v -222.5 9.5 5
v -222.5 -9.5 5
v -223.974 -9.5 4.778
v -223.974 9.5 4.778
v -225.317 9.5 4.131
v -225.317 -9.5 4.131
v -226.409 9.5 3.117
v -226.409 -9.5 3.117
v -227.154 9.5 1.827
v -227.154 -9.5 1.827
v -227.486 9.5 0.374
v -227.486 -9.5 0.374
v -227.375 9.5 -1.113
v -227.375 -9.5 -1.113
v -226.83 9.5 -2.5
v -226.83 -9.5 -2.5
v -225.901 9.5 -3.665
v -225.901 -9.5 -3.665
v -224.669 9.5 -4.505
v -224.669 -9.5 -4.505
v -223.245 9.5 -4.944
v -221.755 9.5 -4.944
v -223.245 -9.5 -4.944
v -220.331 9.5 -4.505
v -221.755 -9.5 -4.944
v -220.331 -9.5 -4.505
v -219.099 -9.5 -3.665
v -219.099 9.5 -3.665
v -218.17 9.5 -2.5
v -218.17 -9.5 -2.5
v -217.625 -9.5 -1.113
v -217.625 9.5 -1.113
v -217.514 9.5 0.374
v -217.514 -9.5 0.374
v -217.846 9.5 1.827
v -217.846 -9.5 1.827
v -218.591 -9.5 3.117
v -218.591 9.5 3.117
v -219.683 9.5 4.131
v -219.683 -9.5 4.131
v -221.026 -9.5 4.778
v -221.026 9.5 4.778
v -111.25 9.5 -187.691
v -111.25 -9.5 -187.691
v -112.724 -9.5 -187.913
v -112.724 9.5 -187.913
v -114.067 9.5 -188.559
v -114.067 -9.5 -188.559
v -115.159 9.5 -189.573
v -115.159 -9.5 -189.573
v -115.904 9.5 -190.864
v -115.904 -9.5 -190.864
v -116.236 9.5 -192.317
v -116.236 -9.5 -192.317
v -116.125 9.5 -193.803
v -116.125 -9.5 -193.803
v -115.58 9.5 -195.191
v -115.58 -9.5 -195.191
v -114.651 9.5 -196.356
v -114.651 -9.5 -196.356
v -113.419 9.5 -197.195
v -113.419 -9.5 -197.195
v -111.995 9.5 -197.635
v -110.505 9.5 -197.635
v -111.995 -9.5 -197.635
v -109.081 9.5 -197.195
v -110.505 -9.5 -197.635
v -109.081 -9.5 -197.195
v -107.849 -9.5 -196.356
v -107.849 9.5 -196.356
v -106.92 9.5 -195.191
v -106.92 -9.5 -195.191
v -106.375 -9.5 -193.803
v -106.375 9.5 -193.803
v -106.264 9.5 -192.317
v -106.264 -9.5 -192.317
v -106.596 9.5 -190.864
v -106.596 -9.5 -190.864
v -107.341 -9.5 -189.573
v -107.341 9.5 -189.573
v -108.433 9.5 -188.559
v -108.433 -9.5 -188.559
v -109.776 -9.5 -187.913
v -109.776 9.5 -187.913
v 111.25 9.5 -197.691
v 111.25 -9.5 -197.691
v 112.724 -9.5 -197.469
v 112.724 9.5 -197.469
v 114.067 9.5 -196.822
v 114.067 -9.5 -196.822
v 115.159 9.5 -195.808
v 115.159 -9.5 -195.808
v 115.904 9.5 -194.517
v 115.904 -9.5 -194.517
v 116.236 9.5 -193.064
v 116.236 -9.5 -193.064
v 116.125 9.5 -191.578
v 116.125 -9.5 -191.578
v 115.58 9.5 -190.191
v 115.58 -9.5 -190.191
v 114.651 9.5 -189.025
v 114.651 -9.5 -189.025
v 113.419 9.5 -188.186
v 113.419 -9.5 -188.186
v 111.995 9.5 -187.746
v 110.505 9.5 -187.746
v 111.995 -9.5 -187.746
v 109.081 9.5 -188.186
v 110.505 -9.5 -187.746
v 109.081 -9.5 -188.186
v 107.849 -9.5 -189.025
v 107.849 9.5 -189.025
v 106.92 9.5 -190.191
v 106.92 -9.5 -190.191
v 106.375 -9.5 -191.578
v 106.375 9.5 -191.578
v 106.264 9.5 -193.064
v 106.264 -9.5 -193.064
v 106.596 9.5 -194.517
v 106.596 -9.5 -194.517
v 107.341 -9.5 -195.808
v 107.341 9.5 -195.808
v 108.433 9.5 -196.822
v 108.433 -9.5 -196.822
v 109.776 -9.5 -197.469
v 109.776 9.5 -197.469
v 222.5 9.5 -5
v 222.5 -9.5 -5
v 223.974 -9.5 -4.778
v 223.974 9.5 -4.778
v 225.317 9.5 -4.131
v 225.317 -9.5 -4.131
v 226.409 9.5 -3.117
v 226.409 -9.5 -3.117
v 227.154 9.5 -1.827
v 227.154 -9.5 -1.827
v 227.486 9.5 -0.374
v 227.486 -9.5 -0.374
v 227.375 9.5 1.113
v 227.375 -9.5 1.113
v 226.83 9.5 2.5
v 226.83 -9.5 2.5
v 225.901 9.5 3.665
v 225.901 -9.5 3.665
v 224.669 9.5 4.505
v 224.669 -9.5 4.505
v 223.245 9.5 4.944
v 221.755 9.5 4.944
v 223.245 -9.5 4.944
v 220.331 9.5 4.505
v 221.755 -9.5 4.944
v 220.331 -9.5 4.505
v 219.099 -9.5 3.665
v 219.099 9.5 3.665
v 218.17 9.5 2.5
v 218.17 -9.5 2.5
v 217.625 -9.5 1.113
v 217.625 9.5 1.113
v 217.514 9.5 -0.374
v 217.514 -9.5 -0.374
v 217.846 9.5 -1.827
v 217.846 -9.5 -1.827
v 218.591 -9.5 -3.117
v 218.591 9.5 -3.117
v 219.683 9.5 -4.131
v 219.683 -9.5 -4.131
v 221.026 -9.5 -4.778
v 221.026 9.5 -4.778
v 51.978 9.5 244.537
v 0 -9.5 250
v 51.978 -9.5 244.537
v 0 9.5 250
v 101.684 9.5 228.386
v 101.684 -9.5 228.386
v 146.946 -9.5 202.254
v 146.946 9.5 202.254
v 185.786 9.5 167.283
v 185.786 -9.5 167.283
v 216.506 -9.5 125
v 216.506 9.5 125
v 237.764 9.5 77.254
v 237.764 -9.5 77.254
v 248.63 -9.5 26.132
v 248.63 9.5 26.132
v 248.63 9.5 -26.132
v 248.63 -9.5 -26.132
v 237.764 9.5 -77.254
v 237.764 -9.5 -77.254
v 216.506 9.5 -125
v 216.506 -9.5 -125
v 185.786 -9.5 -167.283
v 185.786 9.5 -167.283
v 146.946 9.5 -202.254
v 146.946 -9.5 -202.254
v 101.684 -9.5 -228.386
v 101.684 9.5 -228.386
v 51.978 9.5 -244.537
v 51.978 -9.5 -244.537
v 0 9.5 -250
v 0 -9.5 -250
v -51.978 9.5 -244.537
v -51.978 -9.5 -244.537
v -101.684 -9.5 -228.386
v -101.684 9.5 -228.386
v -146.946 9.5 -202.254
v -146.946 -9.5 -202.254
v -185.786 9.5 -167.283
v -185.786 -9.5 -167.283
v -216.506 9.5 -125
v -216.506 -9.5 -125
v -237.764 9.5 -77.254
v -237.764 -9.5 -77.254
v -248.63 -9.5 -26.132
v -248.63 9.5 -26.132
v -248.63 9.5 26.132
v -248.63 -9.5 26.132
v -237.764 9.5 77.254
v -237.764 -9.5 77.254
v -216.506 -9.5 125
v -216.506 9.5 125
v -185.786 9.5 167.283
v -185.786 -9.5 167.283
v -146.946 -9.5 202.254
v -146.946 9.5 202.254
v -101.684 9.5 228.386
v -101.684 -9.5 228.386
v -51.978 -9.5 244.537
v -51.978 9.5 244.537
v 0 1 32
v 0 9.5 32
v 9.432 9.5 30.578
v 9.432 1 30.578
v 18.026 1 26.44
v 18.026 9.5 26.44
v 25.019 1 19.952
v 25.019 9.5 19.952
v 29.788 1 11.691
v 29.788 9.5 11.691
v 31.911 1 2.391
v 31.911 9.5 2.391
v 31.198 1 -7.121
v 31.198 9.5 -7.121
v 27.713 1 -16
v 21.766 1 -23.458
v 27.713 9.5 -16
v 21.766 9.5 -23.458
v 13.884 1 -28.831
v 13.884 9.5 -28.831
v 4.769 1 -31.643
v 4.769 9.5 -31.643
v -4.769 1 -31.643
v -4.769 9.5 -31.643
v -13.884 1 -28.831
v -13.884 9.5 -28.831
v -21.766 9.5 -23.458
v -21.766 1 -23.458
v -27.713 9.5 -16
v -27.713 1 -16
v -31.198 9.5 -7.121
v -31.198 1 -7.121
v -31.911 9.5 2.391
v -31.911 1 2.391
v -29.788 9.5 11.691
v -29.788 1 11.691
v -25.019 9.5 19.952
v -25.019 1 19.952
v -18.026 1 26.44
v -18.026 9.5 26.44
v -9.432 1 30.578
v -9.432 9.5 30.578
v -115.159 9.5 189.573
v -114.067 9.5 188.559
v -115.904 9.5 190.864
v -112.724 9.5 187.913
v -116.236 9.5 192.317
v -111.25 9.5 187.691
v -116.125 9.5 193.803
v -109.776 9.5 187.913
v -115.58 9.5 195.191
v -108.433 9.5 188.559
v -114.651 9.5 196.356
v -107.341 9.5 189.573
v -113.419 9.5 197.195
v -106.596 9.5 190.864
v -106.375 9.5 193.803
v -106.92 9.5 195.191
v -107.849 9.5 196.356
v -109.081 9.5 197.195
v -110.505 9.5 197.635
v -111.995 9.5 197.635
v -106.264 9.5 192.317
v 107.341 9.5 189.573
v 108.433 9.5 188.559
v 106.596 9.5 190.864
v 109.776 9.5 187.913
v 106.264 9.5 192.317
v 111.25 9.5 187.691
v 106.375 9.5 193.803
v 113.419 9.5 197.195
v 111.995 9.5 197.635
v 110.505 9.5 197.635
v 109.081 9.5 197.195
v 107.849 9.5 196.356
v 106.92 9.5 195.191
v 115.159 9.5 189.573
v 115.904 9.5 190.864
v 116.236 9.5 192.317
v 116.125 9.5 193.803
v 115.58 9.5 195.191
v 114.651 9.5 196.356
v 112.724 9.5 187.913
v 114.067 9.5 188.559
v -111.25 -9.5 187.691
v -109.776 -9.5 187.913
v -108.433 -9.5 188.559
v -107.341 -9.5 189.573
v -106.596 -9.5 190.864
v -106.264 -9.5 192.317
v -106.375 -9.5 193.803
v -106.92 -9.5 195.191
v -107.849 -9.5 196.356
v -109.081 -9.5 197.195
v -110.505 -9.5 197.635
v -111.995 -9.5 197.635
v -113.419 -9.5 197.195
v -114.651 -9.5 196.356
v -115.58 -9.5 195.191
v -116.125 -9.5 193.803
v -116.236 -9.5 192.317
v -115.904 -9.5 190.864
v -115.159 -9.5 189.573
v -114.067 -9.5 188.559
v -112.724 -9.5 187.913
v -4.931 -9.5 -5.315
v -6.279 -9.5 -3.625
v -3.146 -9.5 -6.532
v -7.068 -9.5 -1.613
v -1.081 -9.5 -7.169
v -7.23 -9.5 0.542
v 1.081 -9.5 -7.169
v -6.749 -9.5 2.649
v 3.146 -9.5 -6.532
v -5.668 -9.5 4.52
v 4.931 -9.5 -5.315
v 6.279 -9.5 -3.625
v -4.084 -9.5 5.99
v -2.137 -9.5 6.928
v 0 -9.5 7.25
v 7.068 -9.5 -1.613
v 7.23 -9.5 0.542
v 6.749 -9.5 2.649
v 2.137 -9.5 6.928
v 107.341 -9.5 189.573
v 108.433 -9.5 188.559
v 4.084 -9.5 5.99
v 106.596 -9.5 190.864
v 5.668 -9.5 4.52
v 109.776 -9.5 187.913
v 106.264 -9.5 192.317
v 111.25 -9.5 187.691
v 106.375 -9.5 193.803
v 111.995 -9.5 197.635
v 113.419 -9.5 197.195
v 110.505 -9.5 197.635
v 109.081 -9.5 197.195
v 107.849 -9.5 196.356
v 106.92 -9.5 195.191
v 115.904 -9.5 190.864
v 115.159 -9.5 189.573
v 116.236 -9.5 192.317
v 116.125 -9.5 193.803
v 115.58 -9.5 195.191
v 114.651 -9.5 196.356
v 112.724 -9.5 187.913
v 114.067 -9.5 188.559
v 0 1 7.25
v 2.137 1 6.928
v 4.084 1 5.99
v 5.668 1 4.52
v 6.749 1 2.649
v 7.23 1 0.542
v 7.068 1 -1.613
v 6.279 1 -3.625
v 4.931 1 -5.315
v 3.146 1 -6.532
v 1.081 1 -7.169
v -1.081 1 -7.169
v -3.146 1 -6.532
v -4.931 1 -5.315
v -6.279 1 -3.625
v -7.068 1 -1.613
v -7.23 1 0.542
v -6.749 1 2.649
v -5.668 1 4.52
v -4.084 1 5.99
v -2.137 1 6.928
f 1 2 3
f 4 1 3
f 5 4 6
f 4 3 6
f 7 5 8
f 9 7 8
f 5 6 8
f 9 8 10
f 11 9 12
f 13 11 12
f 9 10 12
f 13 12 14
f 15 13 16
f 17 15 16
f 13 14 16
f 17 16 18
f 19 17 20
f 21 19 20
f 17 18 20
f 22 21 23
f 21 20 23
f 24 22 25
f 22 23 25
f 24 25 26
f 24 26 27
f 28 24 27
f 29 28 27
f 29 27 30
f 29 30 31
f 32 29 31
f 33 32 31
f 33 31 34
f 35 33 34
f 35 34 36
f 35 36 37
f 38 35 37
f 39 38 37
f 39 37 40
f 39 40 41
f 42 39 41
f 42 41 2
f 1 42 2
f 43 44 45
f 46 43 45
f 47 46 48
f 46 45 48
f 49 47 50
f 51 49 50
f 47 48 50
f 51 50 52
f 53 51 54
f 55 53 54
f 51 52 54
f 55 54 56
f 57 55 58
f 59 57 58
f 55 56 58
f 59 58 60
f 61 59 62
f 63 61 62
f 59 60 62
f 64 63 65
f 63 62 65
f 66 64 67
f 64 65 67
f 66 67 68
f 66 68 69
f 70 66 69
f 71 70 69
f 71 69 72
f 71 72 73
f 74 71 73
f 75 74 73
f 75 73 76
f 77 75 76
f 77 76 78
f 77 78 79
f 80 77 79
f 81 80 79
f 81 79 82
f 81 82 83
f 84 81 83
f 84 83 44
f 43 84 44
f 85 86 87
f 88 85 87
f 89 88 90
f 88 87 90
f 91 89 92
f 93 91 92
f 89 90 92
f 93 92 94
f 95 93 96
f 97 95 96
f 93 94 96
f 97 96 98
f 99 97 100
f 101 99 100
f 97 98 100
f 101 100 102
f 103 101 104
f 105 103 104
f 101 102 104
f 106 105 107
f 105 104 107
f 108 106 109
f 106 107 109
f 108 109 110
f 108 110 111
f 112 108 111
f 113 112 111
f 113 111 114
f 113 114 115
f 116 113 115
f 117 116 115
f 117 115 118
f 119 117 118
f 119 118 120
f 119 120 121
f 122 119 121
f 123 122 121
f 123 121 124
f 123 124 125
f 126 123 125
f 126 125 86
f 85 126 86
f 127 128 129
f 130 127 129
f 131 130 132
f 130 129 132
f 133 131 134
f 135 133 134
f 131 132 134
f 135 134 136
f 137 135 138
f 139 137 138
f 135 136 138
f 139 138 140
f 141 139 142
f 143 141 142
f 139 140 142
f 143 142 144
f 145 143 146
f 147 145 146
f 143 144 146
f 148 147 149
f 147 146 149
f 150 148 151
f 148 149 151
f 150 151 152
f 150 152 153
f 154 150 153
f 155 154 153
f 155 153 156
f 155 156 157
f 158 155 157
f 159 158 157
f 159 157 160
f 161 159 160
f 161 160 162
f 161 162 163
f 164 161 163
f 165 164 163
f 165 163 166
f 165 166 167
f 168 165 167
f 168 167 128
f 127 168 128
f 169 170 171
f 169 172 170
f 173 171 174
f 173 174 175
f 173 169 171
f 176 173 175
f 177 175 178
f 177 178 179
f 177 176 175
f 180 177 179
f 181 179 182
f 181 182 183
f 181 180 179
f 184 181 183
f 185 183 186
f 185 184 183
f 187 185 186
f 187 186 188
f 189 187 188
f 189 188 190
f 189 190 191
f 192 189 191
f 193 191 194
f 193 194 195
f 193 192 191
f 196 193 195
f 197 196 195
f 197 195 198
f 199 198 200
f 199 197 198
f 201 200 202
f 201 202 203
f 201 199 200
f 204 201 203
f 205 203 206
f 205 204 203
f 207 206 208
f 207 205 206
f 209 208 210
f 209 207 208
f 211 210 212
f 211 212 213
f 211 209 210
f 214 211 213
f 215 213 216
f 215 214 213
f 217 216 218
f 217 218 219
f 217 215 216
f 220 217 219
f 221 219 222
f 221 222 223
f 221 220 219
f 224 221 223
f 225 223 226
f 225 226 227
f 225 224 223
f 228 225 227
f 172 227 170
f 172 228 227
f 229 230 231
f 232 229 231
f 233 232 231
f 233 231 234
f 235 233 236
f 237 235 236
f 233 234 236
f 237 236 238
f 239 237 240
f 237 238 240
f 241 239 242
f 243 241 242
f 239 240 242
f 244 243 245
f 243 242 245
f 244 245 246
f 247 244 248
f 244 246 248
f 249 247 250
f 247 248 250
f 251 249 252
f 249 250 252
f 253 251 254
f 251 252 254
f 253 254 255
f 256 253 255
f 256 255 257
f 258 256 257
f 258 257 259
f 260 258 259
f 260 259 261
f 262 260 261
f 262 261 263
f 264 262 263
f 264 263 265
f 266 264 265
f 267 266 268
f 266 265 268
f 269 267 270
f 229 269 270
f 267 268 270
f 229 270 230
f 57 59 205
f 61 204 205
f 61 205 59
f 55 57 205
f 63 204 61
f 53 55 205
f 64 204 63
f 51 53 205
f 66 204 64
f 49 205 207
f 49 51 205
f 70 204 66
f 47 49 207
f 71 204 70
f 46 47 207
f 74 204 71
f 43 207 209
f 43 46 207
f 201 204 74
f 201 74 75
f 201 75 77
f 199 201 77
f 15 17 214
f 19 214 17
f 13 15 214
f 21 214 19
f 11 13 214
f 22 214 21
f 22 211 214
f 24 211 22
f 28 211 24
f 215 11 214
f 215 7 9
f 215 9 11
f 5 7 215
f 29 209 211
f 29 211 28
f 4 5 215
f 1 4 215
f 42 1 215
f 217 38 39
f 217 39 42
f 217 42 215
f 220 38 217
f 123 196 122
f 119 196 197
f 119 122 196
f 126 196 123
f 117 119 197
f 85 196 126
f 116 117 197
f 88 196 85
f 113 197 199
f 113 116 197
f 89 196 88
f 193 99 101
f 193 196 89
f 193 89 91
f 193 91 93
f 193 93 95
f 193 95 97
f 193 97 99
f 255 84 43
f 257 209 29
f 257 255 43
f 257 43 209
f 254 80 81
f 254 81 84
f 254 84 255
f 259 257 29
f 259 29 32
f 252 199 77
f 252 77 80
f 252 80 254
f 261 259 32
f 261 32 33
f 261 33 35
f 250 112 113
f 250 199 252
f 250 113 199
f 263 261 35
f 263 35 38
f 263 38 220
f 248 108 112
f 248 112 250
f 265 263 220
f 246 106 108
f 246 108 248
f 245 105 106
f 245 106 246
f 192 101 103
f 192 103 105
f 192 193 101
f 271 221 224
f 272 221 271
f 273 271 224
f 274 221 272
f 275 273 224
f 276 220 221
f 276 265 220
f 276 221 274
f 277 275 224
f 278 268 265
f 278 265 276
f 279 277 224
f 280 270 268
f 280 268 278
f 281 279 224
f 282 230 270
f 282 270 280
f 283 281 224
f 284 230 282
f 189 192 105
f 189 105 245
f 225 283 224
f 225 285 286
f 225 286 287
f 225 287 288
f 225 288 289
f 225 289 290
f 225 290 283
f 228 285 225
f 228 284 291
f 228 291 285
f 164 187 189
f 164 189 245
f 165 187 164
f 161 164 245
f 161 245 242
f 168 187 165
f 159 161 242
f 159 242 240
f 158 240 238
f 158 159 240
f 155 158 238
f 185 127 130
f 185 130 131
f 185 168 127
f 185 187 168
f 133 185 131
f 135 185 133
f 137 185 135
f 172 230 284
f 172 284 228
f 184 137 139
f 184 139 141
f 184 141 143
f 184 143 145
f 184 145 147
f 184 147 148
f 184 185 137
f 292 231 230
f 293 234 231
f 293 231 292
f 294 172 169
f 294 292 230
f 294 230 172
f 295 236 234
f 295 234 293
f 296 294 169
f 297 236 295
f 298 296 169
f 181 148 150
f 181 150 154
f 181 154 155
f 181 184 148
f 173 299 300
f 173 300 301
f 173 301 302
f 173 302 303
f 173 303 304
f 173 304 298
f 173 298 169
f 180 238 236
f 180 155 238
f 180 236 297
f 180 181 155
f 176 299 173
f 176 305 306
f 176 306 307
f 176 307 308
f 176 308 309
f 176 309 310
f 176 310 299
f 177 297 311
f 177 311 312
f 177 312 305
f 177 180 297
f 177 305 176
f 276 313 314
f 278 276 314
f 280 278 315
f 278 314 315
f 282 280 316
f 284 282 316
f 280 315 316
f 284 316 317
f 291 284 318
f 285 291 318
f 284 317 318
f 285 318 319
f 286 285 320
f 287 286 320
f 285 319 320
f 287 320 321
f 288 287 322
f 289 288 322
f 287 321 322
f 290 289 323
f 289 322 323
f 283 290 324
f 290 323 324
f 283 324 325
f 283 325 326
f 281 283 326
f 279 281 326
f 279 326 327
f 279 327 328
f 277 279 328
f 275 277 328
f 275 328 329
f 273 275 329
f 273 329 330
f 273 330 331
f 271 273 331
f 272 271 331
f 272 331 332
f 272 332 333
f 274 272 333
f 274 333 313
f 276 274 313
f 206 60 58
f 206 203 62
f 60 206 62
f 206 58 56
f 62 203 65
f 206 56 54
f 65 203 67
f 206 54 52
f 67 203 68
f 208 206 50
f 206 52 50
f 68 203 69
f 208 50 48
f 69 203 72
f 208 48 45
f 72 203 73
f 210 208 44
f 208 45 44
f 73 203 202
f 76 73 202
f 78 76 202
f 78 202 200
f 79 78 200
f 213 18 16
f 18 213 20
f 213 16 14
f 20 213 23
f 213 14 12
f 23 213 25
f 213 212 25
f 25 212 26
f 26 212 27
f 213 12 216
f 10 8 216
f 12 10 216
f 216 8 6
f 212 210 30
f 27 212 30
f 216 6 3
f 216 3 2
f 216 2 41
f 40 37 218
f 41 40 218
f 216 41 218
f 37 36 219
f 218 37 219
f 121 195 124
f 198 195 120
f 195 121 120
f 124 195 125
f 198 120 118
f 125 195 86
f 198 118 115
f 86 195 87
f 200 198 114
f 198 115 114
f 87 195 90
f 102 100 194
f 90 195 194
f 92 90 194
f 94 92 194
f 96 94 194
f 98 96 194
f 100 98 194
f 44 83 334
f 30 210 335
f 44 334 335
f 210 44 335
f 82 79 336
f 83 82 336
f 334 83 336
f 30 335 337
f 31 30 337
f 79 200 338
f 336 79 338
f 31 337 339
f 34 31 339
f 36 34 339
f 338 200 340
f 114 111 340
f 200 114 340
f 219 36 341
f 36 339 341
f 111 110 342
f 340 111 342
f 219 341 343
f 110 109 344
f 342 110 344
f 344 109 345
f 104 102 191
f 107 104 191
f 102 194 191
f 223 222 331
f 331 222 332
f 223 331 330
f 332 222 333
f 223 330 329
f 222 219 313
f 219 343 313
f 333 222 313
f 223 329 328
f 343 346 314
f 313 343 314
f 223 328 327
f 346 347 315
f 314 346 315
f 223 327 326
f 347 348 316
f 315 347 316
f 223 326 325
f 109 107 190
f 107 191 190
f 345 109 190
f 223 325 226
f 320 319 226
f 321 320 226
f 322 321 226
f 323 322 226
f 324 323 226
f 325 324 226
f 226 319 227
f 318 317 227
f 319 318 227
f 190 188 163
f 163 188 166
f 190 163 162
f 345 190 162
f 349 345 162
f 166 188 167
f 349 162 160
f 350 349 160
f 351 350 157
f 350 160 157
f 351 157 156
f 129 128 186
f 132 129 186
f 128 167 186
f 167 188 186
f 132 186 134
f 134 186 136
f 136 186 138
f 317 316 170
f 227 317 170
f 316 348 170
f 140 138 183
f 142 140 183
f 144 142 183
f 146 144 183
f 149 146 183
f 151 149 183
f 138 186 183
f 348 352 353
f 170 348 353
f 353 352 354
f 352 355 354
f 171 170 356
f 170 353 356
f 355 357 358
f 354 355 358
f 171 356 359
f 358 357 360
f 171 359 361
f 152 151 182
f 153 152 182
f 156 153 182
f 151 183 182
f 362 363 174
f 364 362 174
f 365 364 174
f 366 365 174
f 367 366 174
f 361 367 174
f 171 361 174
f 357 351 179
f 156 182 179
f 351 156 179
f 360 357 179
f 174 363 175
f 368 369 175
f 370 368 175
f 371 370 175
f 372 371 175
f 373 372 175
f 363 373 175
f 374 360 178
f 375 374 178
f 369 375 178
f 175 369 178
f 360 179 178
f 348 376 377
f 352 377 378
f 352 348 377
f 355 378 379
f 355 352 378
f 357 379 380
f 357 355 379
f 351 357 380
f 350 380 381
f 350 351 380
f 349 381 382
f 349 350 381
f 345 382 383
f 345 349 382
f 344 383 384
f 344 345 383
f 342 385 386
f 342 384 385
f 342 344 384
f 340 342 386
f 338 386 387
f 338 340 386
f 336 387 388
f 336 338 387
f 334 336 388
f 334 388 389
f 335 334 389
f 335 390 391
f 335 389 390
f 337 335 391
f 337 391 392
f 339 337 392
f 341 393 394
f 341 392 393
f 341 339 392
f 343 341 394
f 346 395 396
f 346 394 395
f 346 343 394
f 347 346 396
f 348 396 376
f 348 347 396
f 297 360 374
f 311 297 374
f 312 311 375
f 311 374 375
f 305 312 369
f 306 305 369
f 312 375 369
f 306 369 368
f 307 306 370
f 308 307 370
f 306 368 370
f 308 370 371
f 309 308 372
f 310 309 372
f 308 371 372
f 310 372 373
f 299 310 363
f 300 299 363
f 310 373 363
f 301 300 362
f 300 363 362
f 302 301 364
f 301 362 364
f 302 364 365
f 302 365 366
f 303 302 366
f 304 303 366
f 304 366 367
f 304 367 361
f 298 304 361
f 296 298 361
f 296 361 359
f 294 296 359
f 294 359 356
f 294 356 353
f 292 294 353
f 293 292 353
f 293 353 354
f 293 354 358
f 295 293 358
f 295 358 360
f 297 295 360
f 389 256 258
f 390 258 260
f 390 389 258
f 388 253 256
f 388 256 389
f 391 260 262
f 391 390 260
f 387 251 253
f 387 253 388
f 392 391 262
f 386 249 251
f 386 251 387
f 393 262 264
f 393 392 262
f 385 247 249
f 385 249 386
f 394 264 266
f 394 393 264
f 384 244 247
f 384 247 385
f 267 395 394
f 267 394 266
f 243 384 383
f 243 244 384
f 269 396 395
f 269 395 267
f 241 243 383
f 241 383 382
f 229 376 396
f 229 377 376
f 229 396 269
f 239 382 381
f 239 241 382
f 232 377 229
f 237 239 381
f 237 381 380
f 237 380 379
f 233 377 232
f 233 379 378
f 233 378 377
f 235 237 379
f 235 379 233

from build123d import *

# Parameters (mm, degrees)
SKETCH1_R           = 250
SKETCH1_R_2         = 7.25
BOSS_EXTRUDE1_DEPTH = 9.5
SKETCH2_R           = 32
CUT_EXTRUDE1_DEPTH  = 8.5
SKETCH3_R           = 5
CUT_EXTRUDE2_DEPTH  = 355.063553617


with BuildPart() as part:
    # Sketch1 → Boss-Extrude1 (new, symmetric)
    with BuildSketch(Plane(origin=(0, 0, 0), x_dir=(1, 0, 0), z_dir=(0, 1, 0))):
        with Locations(Location((0, 0, 0), (0, 0, 270))):
            Circle(SKETCH1_R)
        with Locations(Location((0, 0, 0), (0, 0, 270))):
            Circle(SKETCH1_R_2, mode=Mode.SUBTRACT)
    extrude(amount=BOSS_EXTRUDE1_DEPTH, both=True)

    # Sketch2 → Cut-Extrude1 (cut)
    with BuildSketch(Plane(origin=(0, 9.5, 0), x_dir=(1, 0, 0), z_dir=(0, 1, 0))):
        with Locations(Location((0, 0, 0), (0, 0, 270))):
            Circle(SKETCH2_R)
    extrude(amount=-CUT_EXTRUDE1_DEPTH, mode=Mode.SUBTRACT)

    # Sketch3 → Cut-Extrude2 (cut, through all)
    with BuildSketch(Plane.XZ.offset(9.5)):
        with Locations(Location((111.25, 192.690652342, 0), (0, 0, 270))):
            Circle(SKETCH3_R)
        with Locations(Location((222.5, 0, 0), (0, 0, 270))):
            Circle(SKETCH3_R)
        with Locations(Location((-111.25, -192.690652342, 0), (0, 0, 90))):
            Circle(SKETCH3_R)
        with Locations(Location((-222.5, 0, 0), (0, 0, 90))):
            Circle(SKETCH3_R)
        with Locations(Location((-111.25, 192.690652342, 0), (0, 0, 270))):
            Circle(SKETCH3_R)
        with Locations(Location((111.25, -192.690652342, 0), (0, 0, 270))):
            Circle(SKETCH3_R)
    extrude(amount=-CUT_EXTRUDE2_DEPTH, mode=Mode.SUBTRACT)


solid = part.part
